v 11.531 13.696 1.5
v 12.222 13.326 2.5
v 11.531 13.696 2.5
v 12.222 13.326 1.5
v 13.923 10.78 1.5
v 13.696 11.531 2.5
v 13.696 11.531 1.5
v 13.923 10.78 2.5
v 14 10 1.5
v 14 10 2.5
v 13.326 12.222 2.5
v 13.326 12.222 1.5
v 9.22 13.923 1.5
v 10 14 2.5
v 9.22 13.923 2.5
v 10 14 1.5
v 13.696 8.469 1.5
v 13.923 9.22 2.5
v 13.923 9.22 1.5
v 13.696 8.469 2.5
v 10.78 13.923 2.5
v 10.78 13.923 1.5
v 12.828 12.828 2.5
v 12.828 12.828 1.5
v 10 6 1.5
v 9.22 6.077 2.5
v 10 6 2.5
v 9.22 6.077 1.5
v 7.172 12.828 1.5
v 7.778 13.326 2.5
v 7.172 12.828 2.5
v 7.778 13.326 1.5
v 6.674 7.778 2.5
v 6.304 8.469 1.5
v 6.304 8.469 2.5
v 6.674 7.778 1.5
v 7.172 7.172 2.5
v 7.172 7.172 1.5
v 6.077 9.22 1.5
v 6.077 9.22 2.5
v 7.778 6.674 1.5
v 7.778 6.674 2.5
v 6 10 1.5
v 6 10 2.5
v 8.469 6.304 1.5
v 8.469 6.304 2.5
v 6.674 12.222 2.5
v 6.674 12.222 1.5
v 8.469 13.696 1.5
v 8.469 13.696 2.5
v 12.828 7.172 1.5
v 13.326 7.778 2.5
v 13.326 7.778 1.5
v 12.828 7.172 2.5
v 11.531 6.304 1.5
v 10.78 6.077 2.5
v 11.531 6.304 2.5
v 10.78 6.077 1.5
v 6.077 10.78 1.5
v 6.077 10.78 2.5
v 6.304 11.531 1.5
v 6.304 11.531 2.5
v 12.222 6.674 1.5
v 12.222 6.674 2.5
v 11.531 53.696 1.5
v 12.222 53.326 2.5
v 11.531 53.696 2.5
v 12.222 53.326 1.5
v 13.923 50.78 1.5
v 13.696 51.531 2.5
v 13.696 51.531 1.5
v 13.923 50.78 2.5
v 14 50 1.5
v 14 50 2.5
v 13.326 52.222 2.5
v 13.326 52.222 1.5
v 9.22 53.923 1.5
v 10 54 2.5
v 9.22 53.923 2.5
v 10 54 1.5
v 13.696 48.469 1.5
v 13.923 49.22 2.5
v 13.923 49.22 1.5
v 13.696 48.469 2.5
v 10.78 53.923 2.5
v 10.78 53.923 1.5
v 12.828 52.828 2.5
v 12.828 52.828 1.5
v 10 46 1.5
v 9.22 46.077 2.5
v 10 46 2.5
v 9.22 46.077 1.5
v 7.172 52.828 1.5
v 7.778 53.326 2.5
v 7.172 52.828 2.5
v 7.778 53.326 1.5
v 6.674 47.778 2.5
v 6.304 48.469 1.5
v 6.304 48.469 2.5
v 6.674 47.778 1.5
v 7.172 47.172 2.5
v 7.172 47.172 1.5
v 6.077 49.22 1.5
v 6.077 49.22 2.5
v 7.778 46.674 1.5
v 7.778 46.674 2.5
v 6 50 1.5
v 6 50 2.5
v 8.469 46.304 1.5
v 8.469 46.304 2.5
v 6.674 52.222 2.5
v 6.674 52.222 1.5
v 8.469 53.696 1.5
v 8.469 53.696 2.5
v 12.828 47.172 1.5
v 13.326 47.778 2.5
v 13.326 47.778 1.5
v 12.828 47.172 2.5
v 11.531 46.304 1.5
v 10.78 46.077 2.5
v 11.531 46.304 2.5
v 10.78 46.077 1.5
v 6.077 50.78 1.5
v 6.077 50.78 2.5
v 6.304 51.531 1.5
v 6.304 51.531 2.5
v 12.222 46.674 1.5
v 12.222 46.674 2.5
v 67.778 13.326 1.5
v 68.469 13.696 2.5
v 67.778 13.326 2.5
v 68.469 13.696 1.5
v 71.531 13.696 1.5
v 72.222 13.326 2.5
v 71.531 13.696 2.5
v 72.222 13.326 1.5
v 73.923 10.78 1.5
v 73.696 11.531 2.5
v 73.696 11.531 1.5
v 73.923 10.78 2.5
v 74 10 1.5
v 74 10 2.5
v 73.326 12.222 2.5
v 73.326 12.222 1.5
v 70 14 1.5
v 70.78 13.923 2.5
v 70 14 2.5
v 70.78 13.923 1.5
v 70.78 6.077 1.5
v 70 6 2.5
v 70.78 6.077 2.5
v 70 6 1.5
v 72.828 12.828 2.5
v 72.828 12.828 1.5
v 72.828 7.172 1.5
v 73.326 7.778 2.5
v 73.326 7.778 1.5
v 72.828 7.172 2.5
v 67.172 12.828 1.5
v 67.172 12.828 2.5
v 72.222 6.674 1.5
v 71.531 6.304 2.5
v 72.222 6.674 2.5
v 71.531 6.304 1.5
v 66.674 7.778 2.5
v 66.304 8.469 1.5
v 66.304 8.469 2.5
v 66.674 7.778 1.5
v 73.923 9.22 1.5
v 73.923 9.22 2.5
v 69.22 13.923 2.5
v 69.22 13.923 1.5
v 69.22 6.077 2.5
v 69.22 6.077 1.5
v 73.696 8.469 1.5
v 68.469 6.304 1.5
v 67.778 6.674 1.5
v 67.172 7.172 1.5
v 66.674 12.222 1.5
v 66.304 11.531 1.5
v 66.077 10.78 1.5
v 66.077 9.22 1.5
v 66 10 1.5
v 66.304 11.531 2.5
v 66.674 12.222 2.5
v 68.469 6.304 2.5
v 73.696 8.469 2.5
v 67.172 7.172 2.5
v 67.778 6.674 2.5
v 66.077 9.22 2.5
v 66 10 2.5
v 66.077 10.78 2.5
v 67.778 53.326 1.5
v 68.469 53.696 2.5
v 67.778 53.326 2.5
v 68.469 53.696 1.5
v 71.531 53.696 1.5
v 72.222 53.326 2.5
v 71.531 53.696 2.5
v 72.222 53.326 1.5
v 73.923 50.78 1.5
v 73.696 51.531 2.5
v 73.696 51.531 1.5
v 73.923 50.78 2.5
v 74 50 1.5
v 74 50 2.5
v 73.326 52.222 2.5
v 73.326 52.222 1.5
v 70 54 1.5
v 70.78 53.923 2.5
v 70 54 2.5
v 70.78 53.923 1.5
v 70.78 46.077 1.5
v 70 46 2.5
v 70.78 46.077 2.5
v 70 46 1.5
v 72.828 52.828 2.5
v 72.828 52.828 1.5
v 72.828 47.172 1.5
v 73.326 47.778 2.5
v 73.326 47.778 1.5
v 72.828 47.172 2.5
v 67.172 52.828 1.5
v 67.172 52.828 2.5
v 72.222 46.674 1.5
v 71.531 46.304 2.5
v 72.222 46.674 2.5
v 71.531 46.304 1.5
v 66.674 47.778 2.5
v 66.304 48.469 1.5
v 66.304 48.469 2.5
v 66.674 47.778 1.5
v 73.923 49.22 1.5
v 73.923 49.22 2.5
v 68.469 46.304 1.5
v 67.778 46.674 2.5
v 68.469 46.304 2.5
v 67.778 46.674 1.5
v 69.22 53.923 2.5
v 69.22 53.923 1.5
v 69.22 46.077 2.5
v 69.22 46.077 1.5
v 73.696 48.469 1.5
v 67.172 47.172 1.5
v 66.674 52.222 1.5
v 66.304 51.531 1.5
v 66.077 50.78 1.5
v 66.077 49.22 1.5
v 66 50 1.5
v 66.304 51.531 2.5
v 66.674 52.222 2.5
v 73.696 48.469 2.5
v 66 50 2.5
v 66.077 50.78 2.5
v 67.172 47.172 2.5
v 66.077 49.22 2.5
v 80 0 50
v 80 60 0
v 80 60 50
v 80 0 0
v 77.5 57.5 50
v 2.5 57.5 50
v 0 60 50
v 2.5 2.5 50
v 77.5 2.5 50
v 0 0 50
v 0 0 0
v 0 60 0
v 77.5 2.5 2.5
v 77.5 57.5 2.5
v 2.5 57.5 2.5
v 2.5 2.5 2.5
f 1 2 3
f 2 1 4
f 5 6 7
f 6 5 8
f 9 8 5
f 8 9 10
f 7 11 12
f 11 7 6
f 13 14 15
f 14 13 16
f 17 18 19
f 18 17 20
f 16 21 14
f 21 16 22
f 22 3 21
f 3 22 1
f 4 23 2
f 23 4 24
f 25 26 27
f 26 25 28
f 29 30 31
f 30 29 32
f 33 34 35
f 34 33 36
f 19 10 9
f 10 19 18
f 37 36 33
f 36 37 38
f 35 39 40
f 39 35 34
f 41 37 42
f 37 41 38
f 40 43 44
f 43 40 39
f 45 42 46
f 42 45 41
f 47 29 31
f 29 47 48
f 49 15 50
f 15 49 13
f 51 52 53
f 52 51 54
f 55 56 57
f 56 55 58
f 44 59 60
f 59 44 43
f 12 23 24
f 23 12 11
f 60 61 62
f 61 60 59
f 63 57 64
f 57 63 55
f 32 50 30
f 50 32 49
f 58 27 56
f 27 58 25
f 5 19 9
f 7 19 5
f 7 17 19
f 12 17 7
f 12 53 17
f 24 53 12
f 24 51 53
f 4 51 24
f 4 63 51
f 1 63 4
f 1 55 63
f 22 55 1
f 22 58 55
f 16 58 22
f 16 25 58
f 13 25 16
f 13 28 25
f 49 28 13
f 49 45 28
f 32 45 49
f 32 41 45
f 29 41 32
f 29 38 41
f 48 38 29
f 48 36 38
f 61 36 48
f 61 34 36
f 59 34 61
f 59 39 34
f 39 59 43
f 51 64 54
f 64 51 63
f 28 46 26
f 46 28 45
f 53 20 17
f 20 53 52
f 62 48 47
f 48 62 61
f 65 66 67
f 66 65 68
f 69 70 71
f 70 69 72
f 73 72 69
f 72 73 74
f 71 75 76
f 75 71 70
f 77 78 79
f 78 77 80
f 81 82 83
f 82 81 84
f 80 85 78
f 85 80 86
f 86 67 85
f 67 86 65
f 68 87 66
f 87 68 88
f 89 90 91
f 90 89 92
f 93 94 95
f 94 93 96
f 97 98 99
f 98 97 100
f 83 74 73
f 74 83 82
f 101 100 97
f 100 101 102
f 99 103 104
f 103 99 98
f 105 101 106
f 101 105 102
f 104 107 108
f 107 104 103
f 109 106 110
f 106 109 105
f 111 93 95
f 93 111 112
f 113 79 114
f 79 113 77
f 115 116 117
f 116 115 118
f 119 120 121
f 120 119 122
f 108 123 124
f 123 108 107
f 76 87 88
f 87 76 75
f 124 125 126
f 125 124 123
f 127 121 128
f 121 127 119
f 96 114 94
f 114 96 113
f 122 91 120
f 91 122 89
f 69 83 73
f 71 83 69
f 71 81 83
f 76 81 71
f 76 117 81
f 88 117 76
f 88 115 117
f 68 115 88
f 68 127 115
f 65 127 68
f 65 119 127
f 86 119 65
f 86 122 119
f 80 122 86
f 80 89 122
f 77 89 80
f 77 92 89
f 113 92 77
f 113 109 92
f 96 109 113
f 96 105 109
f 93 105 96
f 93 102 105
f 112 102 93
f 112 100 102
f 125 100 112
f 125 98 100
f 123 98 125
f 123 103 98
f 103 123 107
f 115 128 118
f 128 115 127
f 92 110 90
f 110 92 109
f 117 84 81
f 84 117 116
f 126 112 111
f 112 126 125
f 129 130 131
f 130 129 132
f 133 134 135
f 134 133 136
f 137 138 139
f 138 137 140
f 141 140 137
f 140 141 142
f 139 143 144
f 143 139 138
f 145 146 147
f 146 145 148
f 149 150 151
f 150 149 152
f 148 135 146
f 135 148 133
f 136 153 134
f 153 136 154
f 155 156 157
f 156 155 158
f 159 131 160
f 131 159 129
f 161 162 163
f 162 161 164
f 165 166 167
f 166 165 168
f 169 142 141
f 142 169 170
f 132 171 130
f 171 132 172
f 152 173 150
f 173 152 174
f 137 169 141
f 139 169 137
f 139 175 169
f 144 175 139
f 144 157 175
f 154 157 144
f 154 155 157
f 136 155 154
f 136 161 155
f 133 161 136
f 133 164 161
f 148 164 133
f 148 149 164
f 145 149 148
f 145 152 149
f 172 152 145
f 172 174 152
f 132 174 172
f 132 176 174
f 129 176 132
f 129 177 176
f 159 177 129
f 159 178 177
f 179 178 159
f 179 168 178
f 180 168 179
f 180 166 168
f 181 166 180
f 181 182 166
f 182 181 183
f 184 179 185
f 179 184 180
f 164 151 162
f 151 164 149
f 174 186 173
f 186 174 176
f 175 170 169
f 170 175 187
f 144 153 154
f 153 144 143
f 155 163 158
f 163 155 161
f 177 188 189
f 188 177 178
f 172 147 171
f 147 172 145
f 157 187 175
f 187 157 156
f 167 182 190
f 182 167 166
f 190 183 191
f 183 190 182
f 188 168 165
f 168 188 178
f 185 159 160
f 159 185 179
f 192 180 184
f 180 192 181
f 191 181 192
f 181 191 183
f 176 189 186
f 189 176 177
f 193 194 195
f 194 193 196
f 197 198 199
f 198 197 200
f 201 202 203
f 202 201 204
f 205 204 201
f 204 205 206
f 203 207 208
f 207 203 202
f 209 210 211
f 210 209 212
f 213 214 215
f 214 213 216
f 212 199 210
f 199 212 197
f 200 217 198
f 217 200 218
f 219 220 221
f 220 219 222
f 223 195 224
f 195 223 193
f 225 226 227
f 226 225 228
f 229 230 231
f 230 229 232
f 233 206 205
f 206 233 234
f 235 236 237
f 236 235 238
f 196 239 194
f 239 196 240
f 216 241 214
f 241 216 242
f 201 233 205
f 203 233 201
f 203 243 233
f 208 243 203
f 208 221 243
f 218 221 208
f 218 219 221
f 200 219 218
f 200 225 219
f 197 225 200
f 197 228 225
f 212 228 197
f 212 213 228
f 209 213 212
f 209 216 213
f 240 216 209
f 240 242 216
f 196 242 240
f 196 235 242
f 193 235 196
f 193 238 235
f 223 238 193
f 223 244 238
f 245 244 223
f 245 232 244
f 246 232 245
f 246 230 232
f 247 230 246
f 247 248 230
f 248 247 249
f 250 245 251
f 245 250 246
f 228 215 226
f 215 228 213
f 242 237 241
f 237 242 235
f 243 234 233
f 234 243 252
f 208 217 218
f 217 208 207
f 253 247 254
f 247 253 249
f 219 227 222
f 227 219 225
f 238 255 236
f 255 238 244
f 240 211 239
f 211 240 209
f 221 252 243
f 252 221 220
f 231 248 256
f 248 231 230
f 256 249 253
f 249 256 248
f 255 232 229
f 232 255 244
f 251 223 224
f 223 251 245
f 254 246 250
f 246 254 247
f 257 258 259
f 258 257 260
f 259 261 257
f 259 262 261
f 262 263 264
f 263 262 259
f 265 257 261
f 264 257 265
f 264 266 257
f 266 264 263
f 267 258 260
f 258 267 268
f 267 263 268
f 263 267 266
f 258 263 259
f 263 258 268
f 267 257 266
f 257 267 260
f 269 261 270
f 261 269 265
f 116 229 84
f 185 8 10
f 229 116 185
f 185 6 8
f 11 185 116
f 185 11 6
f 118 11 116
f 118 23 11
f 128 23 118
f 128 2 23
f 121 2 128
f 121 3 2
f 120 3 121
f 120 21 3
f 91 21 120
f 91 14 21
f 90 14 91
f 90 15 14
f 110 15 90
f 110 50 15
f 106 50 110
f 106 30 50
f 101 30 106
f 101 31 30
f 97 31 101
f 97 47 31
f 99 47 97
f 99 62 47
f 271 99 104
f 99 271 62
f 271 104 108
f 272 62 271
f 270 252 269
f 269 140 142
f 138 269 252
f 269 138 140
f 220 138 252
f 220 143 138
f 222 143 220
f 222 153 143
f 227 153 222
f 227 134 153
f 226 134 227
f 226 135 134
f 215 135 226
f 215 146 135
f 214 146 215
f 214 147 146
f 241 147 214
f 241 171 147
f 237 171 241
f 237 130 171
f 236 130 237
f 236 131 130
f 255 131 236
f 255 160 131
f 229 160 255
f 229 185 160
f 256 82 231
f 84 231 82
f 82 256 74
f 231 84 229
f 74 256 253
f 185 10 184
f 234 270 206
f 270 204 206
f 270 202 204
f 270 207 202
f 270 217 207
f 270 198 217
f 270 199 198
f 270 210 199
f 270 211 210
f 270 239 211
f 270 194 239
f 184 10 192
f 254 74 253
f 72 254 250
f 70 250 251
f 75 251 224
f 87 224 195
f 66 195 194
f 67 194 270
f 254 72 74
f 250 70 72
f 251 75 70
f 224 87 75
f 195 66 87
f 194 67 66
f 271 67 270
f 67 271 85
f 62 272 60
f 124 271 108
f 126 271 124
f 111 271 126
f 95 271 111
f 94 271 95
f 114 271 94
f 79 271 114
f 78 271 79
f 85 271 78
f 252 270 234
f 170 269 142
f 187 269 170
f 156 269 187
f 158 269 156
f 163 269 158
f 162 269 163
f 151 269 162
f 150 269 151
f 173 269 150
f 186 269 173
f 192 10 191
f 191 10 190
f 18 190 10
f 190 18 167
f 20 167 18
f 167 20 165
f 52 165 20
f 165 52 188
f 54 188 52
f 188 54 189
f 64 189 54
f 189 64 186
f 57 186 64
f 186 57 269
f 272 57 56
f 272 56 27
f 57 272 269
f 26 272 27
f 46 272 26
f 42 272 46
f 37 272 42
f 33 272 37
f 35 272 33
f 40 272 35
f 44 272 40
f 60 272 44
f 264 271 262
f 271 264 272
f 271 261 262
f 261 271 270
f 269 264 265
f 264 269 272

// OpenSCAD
$fn = 32;

// ----------------------------------------------------------------------
// Enclosure box: bosses enclosure
// ----------------------------------------------------------------------

// --- parameters (mm) ---
box_l = 80;               // outer length, X
box_w = 60;               // outer width, Y
box_h = 50;               // outer height
wall_t = 2.5;             // wall thickness
boss_r = 4;               // corner boss radius
hole_r = 1.5;             // boss screw hole radius
boss_in = 10;             // boss inset from the corners

inner_h = box_h - wall_t;  // cavity depth
boss_h = inner_h - 2;  // corner boss height

difference() {
  cube([box_l, box_w, box_h]);
  translate([wall_t, wall_t, wall_t])
    cube([box_l - 2 * wall_t, box_w - 2 * wall_t, box_h]);
  for (sx = [0, 1], sy = [0, 1])
    translate([sx ? box_l - boss_in : boss_in,
               sy ? box_w - boss_in : boss_in, wall_t - 1]) {
      cylinder(r = boss_r, h = boss_h);
      translate([0, 0, boss_h - 4])
        cylinder(r = hole_r, h = 5);
    }
}
